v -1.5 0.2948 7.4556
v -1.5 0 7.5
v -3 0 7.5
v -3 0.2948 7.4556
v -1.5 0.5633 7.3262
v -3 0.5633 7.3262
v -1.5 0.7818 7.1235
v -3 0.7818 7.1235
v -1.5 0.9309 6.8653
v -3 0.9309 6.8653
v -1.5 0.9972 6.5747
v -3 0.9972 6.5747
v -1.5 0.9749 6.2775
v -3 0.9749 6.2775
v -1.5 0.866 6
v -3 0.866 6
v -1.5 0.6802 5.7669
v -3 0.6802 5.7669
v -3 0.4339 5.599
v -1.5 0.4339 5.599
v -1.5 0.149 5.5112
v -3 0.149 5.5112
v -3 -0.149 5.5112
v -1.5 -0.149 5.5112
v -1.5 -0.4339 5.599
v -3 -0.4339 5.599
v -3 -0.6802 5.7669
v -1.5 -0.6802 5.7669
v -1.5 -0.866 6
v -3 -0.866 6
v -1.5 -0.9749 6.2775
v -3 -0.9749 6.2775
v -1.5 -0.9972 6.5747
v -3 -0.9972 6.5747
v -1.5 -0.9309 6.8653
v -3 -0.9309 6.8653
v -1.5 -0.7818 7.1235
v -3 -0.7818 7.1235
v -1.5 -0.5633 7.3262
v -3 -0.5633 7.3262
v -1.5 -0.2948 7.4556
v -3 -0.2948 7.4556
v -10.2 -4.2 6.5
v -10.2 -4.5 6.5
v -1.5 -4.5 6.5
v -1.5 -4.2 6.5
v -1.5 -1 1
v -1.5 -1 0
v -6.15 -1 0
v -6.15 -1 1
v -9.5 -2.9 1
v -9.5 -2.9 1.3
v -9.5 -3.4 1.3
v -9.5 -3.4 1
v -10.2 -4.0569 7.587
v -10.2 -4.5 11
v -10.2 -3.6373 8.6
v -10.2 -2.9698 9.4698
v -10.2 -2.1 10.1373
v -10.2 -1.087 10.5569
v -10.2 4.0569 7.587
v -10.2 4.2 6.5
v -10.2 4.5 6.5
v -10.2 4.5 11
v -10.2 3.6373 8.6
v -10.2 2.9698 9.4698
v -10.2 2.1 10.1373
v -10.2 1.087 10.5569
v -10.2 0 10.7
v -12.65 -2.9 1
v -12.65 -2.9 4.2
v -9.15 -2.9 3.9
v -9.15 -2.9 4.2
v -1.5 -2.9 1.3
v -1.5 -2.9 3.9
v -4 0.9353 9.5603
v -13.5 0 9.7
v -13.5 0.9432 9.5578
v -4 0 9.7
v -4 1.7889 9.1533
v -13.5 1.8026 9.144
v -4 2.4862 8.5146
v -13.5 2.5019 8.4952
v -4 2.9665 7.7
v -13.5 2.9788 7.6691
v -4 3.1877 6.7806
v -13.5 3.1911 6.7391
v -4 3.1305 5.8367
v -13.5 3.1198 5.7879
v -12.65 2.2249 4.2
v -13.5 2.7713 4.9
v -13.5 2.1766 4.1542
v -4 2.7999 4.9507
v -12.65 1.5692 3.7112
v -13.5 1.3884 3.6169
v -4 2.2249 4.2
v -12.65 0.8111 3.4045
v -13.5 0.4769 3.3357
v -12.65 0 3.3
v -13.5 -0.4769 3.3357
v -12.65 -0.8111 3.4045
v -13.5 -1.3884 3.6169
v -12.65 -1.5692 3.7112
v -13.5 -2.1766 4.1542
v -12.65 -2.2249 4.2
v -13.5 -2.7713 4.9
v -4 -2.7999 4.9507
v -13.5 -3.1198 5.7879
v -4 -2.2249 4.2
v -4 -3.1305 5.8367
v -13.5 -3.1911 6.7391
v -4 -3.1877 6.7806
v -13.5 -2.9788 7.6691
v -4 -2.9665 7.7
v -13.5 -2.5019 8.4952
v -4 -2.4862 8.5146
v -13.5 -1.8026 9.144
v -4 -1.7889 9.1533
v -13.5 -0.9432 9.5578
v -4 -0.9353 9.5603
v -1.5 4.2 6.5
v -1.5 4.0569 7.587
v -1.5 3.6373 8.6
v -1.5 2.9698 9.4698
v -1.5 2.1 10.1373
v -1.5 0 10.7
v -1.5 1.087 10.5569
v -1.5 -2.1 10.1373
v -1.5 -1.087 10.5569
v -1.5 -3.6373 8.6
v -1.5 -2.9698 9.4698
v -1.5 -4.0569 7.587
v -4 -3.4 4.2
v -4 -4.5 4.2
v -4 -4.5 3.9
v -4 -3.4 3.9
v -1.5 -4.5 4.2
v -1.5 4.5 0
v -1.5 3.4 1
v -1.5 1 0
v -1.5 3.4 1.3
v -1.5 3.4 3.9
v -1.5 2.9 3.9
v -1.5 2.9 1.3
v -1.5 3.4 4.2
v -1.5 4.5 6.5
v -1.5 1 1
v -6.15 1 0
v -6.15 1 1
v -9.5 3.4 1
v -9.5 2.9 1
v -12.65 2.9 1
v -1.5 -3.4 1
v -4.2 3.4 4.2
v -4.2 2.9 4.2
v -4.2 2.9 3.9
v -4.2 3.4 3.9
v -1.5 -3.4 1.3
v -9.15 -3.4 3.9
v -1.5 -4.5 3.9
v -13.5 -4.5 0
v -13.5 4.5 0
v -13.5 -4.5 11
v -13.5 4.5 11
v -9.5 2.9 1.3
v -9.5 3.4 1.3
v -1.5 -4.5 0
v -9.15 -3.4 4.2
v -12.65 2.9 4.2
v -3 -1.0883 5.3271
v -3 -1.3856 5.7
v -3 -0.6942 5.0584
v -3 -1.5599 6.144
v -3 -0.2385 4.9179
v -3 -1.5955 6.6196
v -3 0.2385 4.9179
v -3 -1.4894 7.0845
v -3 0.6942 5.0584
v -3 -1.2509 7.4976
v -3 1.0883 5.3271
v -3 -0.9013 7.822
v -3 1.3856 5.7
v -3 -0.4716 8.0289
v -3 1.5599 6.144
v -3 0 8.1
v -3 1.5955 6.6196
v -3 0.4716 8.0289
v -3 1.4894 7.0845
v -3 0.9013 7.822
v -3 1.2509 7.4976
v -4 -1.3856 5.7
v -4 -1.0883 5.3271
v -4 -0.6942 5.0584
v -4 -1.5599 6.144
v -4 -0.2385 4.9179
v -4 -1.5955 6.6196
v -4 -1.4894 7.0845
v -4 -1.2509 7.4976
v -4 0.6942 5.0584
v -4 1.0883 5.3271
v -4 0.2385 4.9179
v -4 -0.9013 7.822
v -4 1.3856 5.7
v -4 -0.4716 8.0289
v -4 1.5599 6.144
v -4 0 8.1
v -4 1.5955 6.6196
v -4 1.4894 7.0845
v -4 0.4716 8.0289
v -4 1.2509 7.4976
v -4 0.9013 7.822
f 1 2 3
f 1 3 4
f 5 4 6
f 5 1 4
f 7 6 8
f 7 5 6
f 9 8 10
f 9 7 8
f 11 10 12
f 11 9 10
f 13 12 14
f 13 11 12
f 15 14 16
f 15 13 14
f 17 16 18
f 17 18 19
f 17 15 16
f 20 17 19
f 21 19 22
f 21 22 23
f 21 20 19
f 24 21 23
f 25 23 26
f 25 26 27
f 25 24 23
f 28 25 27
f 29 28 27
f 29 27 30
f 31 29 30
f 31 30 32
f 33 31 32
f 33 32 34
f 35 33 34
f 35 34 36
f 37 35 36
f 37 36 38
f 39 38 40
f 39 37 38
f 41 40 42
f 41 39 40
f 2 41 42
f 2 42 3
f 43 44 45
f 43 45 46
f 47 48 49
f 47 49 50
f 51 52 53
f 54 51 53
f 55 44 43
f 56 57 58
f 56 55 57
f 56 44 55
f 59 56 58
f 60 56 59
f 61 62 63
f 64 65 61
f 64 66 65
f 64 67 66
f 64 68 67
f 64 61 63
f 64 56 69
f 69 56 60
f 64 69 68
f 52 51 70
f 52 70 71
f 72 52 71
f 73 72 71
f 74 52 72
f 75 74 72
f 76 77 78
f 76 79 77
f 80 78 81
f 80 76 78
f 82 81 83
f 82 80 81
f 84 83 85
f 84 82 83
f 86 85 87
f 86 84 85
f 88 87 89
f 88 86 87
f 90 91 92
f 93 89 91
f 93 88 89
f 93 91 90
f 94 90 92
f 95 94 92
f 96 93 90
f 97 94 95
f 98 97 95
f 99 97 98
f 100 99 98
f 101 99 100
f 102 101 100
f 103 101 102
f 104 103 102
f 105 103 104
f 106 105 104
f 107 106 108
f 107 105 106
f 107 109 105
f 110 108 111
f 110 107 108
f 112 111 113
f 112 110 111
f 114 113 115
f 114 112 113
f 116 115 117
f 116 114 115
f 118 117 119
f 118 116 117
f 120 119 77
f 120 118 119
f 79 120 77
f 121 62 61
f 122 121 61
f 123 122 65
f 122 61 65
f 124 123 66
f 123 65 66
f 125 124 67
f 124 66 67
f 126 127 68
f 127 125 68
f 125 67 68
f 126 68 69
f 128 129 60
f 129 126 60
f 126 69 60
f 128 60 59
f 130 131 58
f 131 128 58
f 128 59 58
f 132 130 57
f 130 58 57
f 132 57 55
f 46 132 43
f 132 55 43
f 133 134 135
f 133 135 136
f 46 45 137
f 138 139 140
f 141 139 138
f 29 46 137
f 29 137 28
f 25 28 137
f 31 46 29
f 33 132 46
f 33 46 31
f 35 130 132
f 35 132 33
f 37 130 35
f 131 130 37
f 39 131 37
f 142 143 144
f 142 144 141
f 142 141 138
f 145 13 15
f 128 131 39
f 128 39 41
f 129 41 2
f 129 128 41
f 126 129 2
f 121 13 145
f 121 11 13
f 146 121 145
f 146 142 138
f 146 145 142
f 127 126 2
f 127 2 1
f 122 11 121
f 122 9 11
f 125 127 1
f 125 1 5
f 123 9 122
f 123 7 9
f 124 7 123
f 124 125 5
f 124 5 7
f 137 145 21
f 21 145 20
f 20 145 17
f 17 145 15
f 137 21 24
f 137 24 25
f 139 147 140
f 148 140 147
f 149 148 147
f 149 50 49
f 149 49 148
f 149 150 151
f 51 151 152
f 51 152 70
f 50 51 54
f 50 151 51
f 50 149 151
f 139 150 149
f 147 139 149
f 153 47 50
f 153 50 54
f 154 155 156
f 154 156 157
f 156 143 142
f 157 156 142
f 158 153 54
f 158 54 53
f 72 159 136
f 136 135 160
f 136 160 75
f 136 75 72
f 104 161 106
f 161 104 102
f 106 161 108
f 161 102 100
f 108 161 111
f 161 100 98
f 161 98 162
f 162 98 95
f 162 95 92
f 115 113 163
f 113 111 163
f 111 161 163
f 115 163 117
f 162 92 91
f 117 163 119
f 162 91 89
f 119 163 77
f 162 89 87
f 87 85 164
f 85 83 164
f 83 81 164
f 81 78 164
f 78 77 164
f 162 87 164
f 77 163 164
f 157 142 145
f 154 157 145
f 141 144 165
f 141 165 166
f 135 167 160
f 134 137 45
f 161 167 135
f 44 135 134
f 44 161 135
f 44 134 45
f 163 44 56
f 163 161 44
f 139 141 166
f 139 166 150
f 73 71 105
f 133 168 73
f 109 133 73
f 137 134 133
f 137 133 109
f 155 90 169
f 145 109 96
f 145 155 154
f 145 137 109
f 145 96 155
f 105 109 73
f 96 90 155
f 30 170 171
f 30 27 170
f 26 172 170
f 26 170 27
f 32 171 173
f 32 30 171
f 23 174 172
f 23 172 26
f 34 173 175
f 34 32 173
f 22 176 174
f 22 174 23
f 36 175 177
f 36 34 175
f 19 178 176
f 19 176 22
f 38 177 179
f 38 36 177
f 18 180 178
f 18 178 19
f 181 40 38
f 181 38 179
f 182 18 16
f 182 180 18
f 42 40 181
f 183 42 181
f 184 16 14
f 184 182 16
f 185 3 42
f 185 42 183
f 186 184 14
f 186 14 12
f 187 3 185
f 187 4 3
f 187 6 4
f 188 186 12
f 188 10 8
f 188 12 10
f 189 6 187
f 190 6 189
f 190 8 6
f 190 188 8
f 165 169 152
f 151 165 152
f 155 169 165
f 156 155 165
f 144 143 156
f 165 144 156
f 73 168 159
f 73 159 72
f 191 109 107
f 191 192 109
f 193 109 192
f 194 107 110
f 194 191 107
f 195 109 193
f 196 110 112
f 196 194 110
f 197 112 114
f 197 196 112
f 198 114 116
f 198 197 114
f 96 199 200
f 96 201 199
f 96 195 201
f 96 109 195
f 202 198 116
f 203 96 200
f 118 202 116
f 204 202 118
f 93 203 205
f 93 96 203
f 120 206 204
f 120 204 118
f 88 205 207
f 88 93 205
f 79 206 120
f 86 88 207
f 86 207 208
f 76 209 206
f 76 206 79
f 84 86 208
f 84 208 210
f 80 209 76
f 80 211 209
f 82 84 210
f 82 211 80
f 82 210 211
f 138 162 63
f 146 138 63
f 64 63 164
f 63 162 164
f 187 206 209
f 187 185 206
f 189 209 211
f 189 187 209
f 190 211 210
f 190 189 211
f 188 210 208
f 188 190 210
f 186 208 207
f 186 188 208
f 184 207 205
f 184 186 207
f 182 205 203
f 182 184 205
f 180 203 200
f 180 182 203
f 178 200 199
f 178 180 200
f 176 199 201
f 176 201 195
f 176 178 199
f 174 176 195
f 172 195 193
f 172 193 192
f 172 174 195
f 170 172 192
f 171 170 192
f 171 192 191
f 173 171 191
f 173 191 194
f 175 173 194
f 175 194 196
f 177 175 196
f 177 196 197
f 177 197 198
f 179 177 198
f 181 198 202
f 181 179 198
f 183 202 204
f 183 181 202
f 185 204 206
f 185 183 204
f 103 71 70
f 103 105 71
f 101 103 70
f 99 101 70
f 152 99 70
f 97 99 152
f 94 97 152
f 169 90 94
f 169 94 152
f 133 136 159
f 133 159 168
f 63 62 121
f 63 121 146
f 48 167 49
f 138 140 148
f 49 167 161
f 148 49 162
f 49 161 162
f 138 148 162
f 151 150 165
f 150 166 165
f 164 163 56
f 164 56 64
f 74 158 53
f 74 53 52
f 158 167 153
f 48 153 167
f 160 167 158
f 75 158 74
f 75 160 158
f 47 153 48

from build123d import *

# Parameters (mm, degrees)
SKETCH024_W     = 9
SKETCH024_H     = 11
PAD009_DEPTH    = 12
POCKET006_DEPTH = 8.701
POCKET007_DEPTH = 8
SKETCH034_W     = 5.8
SKETCH034_H     = 3.2
POCKET008_DEPTH = 12.65
SKETCH035_W     = 3.4
SKETCH035_H     = 0.3
POCKET009_DEPTH = 9.15
SKETCH036_W     = 3.4
SKETCH036_H     = 0.3
POCKET010_DEPTH = 4.2
SKETCH037_W     = 4.6
SKETCH037_H     = 0.3
POCKET011_DEPTH = 4
SKETCH038_W     = 2
SKETCH038_H     = 1
POCKET012_DEPTH = 6.15


with BuildPart() as part:
    # Sketch024 → Pad009 (new body)
    with BuildSketch(Plane.YZ.offset(-13.5)):
        with Locations((0, 6)):
            Rectangle(SKETCH024_W, SKETCH024_H)
    extrude(amount=PAD009_DEPTH)

    # Sketch025 → Pocket006 (cut, through all)
    with BuildSketch(Plane.YZ.offset(-10.2)):
        with BuildLine():
            Line((-5, 7), (-4.2, 7))
            ThreePointArc((4.2, 7), (0, 11.2), (-4.2, 7))
            Line((4.2, 7), (5, 7))
            Line((5, 12), (5, 7))
            Line((-5, 12), (5, 12))
            Line((-5, 7), (-5, 12))
        make_face()
    extrude(amount=POCKET006_DEPTH, mode=Mode.SUBTRACT)

    # Sketch031 → Groove (revolve, cut)
    with BuildSketch(Plane.XZ):
        Polygon((-3, 8.6), (-3, 8), (0, 8), (0, 7), (-14, 7), (-14, 10.2), (-4, 10.2), (-4, 8.6), align=None)
    revolve(axis=Axis((-14, 0, 7), (-1, 0, 0)), mode=Mode.SUBTRACT)

    # Sketch032 → Pocket007 (cut)
    with BuildSketch(Plane.YZ.offset(-1.5)):
        Polygon((-2.9, 4.4), (2.9, 4.4), (2.9, 1.8), (3.4, 1.8), (3.4, 1.5), (-3.4, 1.5), (-3.4, 1.8), (-2.9, 1.8), align=None)
    extrude(amount=-POCKET007_DEPTH, mode=Mode.SUBTRACT)

    # Sketch034 → Pocket008 (cut)
    with BuildSketch(Plane.YZ):
        with Locations((0, 3.1)):
            Rectangle(SKETCH034_W, SKETCH034_H)
    extrude(amount=-POCKET008_DEPTH, mode=Mode.SUBTRACT)

    # Sketch035 → Pocket009 (cut)
    with BuildSketch(Plane.YZ):
        with Locations((-1.7, 4.55)):
            Rectangle(SKETCH035_W, SKETCH035_H)
    extrude(amount=-POCKET009_DEPTH, mode=Mode.SUBTRACT)

    # Sketch036 → Pocket010 (cut)
    with BuildSketch(Plane.YZ):
        with Locations((1.7, 4.55)):
            Rectangle(SKETCH036_W, SKETCH036_H)
    extrude(amount=-POCKET010_DEPTH, mode=Mode.SUBTRACT)

    # Sketch037 → Pocket011 (cut)
    with BuildSketch(Plane.YZ):
        with Locations((-2.3, 4.55)):
            Rectangle(SKETCH037_W, SKETCH037_H)
    extrude(amount=-POCKET011_DEPTH, mode=Mode.SUBTRACT)

    # Sketch038 → Pocket012 (cut)
    with BuildSketch(Plane.YZ):
        with Locations((0, 1)):
            Rectangle(SKETCH038_W, SKETCH038_H)
    extrude(amount=-POCKET012_DEPTH, mode=Mode.SUBTRACT)


with BuildPart() as part_1:
    # Body009 placement: moved
    add(part.part.moved(Location((0, 0, -0.5))))


solid = part_1.part
